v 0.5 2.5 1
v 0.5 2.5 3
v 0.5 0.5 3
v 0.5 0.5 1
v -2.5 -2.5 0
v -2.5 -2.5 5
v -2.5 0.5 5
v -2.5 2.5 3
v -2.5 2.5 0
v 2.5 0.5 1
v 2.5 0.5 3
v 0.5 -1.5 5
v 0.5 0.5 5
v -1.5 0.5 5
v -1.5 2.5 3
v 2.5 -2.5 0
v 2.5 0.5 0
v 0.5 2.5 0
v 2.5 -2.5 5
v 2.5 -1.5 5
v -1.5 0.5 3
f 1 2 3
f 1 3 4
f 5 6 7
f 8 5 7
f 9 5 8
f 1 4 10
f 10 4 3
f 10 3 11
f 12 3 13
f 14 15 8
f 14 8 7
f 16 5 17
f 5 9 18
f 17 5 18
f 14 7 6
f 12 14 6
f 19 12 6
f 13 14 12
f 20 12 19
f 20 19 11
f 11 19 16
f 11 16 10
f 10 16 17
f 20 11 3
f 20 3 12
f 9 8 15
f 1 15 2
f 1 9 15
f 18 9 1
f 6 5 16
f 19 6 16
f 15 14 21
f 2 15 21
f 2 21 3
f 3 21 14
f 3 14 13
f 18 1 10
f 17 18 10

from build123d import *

# Parameters (mm, degrees)
SKETCH1_W           = 5
SKETCH1_H           = 5
BOSS_EXTRUDE1_DEPTH = 5
SKETCH2_W           = 4
SKETCH2_H           = 2
CUT_EXTRUDE1_DEPTH  = 2
SKETCH3_W           = 2
SKETCH3_H           = 2
CUT_EXTRUDE2_DEPTH  = 2
CUT_EXTRUDE3_DEPTH  = 2
CUT_EXTRUDE4_DEPTH  = 2
CUT_EXTRUDE5_DEPTH  = 2


with BuildPart() as part:
    # Sketch1 → Boss-Extrude1 (new body)
    with BuildSketch(Plane.XY):
        Rectangle(SKETCH1_W, SKETCH1_H)
    extrude(amount=BOSS_EXTRUDE1_DEPTH)

    # Sketch2 → Cut-Extrude1 (cut)
    with BuildSketch(Plane(origin=(0, 2.5, 0), x_dir=(1, 0, 0), z_dir=(0, 1, 0))):
        with Locations((0.5, -4)):
            Rectangle(SKETCH2_W, SKETCH2_H)
    extrude(amount=-CUT_EXTRUDE1_DEPTH, mode=Mode.SUBTRACT)

    # Sketch3 → Cut-Extrude2 (cut)
    with BuildSketch(Plane(origin=(0, 2.5, 0), x_dir=(1, 0, 0), z_dir=(0, 1, 0))):
        with Locations((1.5, -2)):
            Rectangle(SKETCH3_W, SKETCH3_H)
    extrude(amount=-CUT_EXTRUDE2_DEPTH, mode=Mode.SUBTRACT)

    # Sketch4 → Cut-Extrude3 (cut, through all)
    with BuildSketch(Plane.XY.offset(1)):
        Polygon((0.5, 2.5), (2.5, 0.5), (2.5, 2.5), align=None)
    extrude(amount=-CUT_EXTRUDE3_DEPTH, mode=Mode.SUBTRACT)

    # Sketch5 → Cut-Extrude4 (cut)
    with BuildSketch(Plane(origin=(2.5, 0, 0), x_dir=(0, 0, -1), z_dir=(1, 0, 0))):
        Polygon((-5, 0.5), (-3, 0.5), (-5, -1.5), align=None)
    extrude(amount=-CUT_EXTRUDE4_DEPTH, mode=Mode.SUBTRACT)

    # Sketch6 → Cut-Extrude5 (cut, through all)
    with BuildSketch(Plane(origin=(-1.5, 0, 0), x_dir=(0, 0, -1), z_dir=(1, 0, 0))):
        Polygon((-3, 2.5), (-5, 0.5), (-5, 2.5), align=None)
    extrude(amount=-CUT_EXTRUDE5_DEPTH, mode=Mode.SUBTRACT)


solid = part.part
